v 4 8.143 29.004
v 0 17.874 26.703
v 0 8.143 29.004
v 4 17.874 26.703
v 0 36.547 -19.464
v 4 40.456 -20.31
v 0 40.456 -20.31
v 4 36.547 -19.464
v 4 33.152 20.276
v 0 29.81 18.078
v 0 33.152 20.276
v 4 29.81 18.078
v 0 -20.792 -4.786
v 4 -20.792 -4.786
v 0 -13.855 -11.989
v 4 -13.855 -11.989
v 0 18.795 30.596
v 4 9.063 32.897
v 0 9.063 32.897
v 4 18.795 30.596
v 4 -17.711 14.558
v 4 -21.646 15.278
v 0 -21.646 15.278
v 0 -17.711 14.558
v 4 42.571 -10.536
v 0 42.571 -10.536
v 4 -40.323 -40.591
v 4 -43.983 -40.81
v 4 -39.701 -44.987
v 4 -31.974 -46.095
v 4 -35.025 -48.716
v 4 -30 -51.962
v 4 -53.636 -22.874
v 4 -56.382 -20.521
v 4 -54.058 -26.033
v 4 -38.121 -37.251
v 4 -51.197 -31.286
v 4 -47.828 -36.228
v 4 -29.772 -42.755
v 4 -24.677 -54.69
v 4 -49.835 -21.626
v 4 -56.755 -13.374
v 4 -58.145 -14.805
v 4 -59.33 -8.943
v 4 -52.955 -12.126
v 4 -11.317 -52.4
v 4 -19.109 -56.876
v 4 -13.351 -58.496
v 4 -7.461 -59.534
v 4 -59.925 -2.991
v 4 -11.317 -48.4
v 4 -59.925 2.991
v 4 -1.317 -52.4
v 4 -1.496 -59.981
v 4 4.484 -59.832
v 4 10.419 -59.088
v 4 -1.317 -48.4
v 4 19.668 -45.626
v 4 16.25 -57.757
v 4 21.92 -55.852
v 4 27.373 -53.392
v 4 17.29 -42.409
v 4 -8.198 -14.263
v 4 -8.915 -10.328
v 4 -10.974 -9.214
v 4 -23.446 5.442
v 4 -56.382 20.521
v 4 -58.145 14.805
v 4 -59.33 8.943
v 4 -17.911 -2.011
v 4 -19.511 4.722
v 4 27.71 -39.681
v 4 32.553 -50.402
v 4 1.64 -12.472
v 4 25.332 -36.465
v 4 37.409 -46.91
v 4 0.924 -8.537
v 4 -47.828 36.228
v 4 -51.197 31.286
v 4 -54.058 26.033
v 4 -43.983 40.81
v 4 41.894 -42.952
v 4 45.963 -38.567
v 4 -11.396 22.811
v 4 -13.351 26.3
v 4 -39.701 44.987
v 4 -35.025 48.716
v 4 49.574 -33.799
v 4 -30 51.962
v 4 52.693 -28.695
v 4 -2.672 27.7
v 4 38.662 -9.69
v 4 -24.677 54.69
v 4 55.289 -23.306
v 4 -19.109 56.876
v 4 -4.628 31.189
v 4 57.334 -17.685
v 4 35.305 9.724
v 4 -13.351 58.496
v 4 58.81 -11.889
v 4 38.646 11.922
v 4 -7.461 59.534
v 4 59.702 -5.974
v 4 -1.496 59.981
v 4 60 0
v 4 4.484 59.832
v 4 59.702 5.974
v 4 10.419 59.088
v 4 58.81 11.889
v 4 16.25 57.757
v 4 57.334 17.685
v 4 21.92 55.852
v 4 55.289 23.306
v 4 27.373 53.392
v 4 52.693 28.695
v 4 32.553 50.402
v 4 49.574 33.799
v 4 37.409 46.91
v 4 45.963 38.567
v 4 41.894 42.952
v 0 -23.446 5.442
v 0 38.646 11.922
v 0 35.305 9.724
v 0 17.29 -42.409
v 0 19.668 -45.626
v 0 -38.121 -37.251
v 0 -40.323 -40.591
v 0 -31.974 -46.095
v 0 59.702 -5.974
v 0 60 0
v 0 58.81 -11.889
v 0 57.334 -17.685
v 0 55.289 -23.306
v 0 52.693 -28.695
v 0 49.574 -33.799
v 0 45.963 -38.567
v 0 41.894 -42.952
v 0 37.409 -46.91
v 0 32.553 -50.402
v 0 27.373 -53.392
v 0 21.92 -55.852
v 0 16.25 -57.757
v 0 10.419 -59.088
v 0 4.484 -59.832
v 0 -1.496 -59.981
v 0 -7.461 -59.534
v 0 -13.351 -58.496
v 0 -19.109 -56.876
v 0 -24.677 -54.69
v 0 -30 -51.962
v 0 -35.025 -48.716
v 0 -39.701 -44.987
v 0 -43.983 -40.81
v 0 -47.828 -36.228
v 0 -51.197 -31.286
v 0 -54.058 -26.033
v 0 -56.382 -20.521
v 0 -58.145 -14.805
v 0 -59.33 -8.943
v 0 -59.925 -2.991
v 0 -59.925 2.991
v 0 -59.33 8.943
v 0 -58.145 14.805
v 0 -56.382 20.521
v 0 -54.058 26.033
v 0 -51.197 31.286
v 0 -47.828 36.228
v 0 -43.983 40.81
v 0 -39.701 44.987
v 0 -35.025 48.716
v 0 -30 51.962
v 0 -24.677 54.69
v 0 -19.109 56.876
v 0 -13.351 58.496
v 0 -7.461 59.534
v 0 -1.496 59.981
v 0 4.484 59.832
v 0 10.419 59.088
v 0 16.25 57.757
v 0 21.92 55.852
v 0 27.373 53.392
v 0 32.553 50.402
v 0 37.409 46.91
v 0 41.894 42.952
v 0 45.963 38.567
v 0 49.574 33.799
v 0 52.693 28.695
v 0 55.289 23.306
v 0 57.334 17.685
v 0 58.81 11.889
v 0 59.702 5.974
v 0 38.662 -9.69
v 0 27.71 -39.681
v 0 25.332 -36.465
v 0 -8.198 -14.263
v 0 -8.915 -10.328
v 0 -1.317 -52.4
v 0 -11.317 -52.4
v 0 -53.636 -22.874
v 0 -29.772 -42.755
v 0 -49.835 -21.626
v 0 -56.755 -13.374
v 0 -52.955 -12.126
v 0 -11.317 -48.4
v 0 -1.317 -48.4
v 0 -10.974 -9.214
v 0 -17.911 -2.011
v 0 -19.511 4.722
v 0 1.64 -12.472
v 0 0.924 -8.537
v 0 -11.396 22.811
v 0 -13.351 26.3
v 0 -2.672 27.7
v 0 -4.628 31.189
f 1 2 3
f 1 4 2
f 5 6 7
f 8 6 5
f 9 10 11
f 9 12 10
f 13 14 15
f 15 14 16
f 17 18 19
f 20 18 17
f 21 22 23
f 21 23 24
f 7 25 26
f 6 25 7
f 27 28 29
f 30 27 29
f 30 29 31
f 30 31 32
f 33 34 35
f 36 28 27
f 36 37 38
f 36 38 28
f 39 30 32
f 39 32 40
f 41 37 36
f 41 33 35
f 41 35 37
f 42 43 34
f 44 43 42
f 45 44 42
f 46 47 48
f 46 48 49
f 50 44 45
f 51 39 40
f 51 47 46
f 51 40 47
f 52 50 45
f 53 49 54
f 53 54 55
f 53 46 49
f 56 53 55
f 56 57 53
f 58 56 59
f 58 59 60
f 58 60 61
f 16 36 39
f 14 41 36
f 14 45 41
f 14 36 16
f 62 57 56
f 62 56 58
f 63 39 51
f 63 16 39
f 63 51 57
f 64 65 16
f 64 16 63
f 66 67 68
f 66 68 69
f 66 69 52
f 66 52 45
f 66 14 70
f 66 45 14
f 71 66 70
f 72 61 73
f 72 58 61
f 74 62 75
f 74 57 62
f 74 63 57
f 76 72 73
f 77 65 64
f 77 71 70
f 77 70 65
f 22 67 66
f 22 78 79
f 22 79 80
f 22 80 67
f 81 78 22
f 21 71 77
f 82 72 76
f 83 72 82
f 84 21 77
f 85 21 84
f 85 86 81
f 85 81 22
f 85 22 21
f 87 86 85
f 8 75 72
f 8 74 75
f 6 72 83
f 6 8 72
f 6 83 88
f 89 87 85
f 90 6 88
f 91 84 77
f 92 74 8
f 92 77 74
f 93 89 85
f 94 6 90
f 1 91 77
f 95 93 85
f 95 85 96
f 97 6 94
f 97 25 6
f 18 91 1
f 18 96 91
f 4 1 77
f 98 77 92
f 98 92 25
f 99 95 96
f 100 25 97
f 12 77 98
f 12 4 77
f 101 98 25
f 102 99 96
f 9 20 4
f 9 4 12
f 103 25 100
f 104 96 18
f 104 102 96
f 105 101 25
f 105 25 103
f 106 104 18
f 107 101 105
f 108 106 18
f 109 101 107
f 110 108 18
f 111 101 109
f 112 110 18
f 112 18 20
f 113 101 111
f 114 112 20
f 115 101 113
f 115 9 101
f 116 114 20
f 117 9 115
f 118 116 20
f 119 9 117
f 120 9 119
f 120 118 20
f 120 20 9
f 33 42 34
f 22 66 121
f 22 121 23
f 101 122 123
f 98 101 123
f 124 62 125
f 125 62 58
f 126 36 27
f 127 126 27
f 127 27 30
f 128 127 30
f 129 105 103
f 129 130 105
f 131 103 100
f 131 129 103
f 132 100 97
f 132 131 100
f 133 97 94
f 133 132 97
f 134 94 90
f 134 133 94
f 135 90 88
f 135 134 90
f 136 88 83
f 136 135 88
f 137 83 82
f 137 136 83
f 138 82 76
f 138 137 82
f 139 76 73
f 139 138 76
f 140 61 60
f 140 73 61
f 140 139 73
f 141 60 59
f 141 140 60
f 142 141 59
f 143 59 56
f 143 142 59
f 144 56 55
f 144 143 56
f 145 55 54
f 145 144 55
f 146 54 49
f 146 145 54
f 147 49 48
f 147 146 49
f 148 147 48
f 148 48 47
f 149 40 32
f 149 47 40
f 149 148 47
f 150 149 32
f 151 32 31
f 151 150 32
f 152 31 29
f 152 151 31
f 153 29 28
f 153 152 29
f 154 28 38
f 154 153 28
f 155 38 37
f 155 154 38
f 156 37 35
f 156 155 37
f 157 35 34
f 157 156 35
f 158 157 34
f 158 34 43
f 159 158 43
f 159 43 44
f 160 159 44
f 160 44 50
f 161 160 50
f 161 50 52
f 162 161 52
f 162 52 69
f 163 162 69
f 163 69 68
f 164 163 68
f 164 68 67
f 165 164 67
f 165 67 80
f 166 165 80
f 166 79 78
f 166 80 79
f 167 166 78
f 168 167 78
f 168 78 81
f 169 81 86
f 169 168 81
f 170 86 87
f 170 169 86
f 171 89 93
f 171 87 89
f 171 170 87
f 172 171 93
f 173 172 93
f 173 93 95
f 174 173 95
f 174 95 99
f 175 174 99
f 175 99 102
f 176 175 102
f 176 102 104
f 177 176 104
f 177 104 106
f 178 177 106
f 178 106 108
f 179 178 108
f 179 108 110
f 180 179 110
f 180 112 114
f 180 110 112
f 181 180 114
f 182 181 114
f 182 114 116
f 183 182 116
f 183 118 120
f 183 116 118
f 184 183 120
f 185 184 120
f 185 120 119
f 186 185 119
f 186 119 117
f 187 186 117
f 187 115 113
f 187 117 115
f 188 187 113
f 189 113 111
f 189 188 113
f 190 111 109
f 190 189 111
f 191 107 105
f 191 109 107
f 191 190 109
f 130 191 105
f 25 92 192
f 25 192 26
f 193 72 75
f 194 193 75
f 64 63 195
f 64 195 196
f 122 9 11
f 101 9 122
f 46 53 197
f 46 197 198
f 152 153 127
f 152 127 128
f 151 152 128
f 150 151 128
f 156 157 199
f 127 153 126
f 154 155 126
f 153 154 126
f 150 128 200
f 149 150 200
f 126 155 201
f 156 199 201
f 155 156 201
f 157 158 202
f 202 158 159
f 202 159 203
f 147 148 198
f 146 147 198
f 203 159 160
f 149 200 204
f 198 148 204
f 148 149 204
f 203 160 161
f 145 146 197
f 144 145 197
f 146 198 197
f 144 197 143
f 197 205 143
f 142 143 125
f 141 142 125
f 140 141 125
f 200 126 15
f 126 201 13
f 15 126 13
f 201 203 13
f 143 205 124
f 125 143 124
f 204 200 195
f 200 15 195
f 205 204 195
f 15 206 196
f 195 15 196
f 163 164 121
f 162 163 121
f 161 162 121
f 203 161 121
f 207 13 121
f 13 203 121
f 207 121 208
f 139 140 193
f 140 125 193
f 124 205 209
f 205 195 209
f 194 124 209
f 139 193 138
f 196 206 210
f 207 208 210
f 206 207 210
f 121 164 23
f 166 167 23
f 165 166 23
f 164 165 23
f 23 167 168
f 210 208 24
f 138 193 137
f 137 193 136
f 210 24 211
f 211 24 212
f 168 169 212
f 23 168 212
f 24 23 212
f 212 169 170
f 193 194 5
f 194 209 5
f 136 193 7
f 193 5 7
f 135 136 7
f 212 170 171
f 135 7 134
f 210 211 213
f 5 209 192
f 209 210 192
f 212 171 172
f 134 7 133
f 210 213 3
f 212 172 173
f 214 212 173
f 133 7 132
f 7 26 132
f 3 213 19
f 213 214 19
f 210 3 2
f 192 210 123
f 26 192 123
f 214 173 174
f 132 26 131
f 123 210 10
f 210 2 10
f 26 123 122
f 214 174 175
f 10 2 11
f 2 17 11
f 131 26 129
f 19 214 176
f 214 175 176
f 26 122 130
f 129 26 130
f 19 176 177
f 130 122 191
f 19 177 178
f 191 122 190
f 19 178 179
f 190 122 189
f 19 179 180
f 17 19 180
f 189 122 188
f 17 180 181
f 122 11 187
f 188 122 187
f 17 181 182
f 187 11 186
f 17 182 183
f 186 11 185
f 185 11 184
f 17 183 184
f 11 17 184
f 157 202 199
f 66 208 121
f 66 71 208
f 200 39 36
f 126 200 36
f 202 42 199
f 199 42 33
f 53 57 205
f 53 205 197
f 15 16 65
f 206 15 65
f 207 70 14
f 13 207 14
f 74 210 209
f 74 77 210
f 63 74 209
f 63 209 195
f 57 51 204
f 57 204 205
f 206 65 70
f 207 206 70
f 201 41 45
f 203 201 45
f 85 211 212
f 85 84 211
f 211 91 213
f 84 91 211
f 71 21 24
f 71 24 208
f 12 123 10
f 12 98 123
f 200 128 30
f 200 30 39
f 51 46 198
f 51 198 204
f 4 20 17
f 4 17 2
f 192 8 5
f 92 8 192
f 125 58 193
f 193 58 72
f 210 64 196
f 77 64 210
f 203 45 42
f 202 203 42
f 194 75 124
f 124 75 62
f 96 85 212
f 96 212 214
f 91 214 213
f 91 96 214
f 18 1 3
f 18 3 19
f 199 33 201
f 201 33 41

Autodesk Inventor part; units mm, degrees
ref_plane "YZ Plane" through (0, 0, 0) normal (1, 0, 0) x (0, 1, 0)
ref_plane "XZ Plane" through (0, 0, 0) normal (0, 1, 0) x (-1, 0, 0)
ref_plane "XY Plane" through (0, 0, 0) normal (0, 0, 1) x (1, 0, 0)
sketch "Эскиз1" plane through (0, 0, 0) normal (1, 0, 0) x (0, 1, 0)
  circle A0 centre (0, 0) radius 60
  point P0 (0, -60)
extrude "Выдавливание1" add sketch "Эскиз1" along normal blind 4
sketch "Эскиз2" plane through (4, 0, 0) normal (1, 0, 0) x (0, 0, -1)
  point P0 (0, 0)
  point P1 (0, -60)
sketch "Эскиз3" plane through (4, 0, 0) normal (1, 0, 0) x (0, 0, -1)
  line L0 (0, -92.75) -> (0, 85.4583) construction
  circle A0 centre (0, 0) radius 60 construction
  line L1 (40.5908, -40.3227) -> (46.095, -31.9738)
  line L2 (46.095, -31.9738) -> (42.7554, -29.7722)
  line L3 (42.7554, -29.7722) -> (37.2513, -38.1211)
  line L4 (37.2513, -38.1211) -> (40.5908, -40.3227)
  line L5 (40.5908, -40.3227) -> (42.7554, -29.7722) construction
  line L6 (46.095, -31.9738) -> (37.2513, -38.1211) construction
  line L7 (41.6731, -35.0475) -> (44.4252, -30.873) construction
  line L8 (31.7471, -46.47) -> (48.2596, -21.4233) construction
  line L9 (48.2596, -21.4233) -> (51.5992, -23.6249) construction
  line L10 (51.5992, -23.6249) -> (35.0866, -48.6716) construction
  line L11 (35.0866, -48.6716) -> (31.7471, -46.47) construction
  line L12 (31.7471, -46.47) -> (51.5992, -23.6249) construction
  line L13 (48.2596, -21.4233) -> (35.0866, -48.6716) construction
  circle A1 centre (0, 0) radius 60 projected
  line L14 (48.3995, -11.3168) -> (48.3995, -1.3168)
  line L15 (48.3995, -1.3168) -> (52.3995, -1.3168)
  line L16 (52.3995, -1.3168) -> (52.3995, -11.3168) construction
  line L17 (52.3995, -11.3168) -> (48.3995, -11.3168)
  line L18 (48.3995, -11.3168) -> (52.3995, -1.3168) construction
  line L19 (48.3995, -1.3168) -> (52.3995, -11.3168) construction
  line L20 (48.3995, -21.3168) -> (48.3995, 8.6832) construction
  line L21 (48.3995, 8.6832) -> (52.3995, 8.6832) construction
  line L22 (52.3995, 8.6832) -> (52.3995, -21.3168)
  line L23 (52.3995, -21.3168) -> (48.3995, -21.3168) construction
  line L24 (48.3995, -21.3168) -> (52.3995, 8.6832) construction
  line L25 (48.3995, 8.6832) -> (52.3995, -21.3168) construction
  line L26 (50.3995, -6.3168) -> (50.3995, 8.6832) construction
  line L27 (36.4646, 25.3316) -> (42.4094, 17.2905)
  line L28 (42.4094, 17.2905) -> (45.6259, 19.6684)
  line L29 (45.6259, 19.6684) -> (39.6811, 27.7095)
  line L30 (39.6811, 27.7095) -> (36.4646, 25.3316)
  line L31 (36.4646, 25.3316) -> (45.6259, 19.6684) construction
  line L32 (42.4094, 17.2905) -> (39.6811, 27.7095) construction
  line L33 (30.5198, 33.3727) -> (48.3542, 9.2494) construction
  line L34 (48.3542, 9.2494) -> (51.5707, 11.6273) construction
  line L35 (51.5707, 11.6273) -> (33.7363, 35.7506) construction
  line L36 (33.7363, 35.7506) -> (30.5198, 33.3727) construction
  line L37 (30.5198, 33.3727) -> (51.5707, 11.6273) construction
  line L38 (48.3542, 9.2494) -> (33.7363, 35.7506) construction
  line L39 (41.0453, 22.5) -> (32.1281, 34.5617) construction
  line L40 (10.536, 42.571) -> (20.3099, 40.4564)
  line L41 (20.3099, 40.4564) -> (19.464, 36.5468)
  line L42 (19.464, 36.5468) -> (9.6901, 38.6615)
  line L43 (9.6901, 38.6615) -> (10.536, 42.571)
  line L44 (10.536, 42.571) -> (19.464, 36.5468) construction
  line L45 (20.3099, 40.4564) -> (9.6901, 38.6615) construction
  line L46 (-0.0837, 40.7762) -> (29.2378, 34.4321) construction
  line L47 (29.2378, 34.4321) -> (30.0837, 38.3417) construction
  line L48 (30.0837, 38.3417) -> (0.7622, 44.6857) construction
  line L49 (0.7622, 44.6857) -> (-0.0837, 40.7762) construction
  line L50 (-0.0837, 40.7762) -> (30.0837, 38.3417) construction
  line L51 (29.2378, 34.4321) -> (0.7622, 44.6857) construction
  line L52 (0.3392, 42.7309) -> (15, 39.5589) construction
  line L53 (-20.2765, 33.1516) -> (-11.9215, 38.6465)
  line L54 (-11.9215, 38.6465) -> (-9.7235, 35.3046)
  line L55 (-9.7235, 35.3046) -> (-18.0785, 29.8096)
  line L56 (-18.0785, 29.8096) -> (-20.2765, 33.1516)
  line L57 (-20.2765, 33.1516) -> (-9.7235, 35.3046) construction
  line L58 (-11.9215, 38.6465) -> (-18.0785, 29.8096) construction
  line L59 (-26.4334, 24.3146) -> (-1.3686, 40.7995) construction
  line L60 (-1.3686, 40.7995) -> (-3.5666, 44.1415) construction
  line L61 (-3.5666, 44.1415) -> (-28.6314, 27.6566) construction
  line L62 (-28.6314, 27.6566) -> (-26.4334, 24.3146) construction
  line L63 (-26.4334, 24.3146) -> (-3.5666, 44.1415) construction
  line L64 (-1.3686, 40.7995) -> (-28.6314, 27.6566) construction
  line L65 (-15, 34.2281) -> (-2.4676, 42.4705) construction
  line L66 (-32.897, 9.0632) -> (-30.5956, 18.7948)
  line L67 (-30.5956, 18.7948) -> (-26.703, 17.8742)
  line L68 (-26.703, 17.8742) -> (-29.0044, 8.1427)
  line L69 (-29.0044, 8.1427) -> (-32.897, 9.0632)
  line L70 (-32.897, 9.0632) -> (-26.703, 17.8742) construction
  line L71 (-30.5956, 18.7948) -> (-29.0044, 8.1427) construction
  line L72 (-34.0478, 4.1975) -> (-29.4449, 23.6606) construction
  line L73 (-29.4449, 23.6606) -> (-25.5522, 22.74) construction
  line L74 (-25.5522, 22.74) -> (-30.1551, 3.2769) construction
  line L75 (-30.1551, 3.2769) -> (-34.0478, 4.1975) construction
  line L76 (-34.0478, 4.1975) -> (-25.5522, 22.74) construction
  line L77 (-29.4449, 23.6606) -> (-30.1551, 3.2769) construction
  line L78 (-29.8, 13.4687) -> (-27.4986, 23.2003) construction
  line L79 (-30.1437, 1.6896) -> (-20.3668, -15.7578) construction
  line L80 (-20.3668, -15.7578) -> (-23.8563, -17.7132) construction
  line L81 (-23.8563, -17.7132) -> (-33.6332, -0.2658) construction
  line L82 (-33.6332, -0.2658) -> (-30.1437, 1.6896) construction
  line L83 (-30.1437, 1.6896) -> (-23.8563, -17.7132) construction
  line L84 (-20.3668, -15.7578) -> (-33.6332, -0.2658) construction
  line L85 (-27.6995, -2.6723) -> (-22.811, -11.396)
  line L86 (-22.811, -11.396) -> (-26.3005, -13.3514)
  line L87 (-26.3005, -13.3514) -> (-31.189, -4.6277)
  line L88 (-31.189, -4.6277) -> (-27.6995, -2.6723)
  line L89 (-27.6995, -2.6723) -> (-26.3005, -13.3514) construction
  line L90 (-22.811, -11.396) -> (-31.189, -4.6277) construction
  line L91 (-27, -8.0118) -> (-31.8884, 0.7119) construction
  line L92 (-19.4768, -16.8116) -> (0.1967, -20.411) construction
  line L93 (0.1967, -20.411) -> (-0.5232, -24.3456) construction
  line L94 (-0.5232, -24.3456) -> (-20.1967, -20.7463) construction
  line L95 (-20.1967, -20.7463) -> (-19.4768, -16.8116) construction
  line L96 (-19.4768, -16.8116) -> (-0.5232, -24.3456) construction
  line L97 (0.1967, -20.411) -> (-20.1967, -20.7463) construction
  line L98 (-14.5584, -17.7114) -> (-4.7217, -19.5111)
  line L99 (-4.7217, -19.5111) -> (-5.4416, -23.4458)
  line L100 (-5.4416, -23.4458) -> (-15.2783, -21.6461)
  line L101 (-15.2783, -21.6461) -> (-14.5584, -17.7114)
  line L102 (-14.5584, -17.7114) -> (-5.4416, -23.4458) construction
  line L103 (-4.7217, -19.5111) -> (-15.2783, -21.6461) construction
  line L104 (-10, -20.5786) -> (-19.8367, -18.7789) construction
  line L105 (11.0144, -9.2398) -> (0.2107, -19.6457) construction
  line L106 (0.2107, -19.6457) -> (2.9856, -22.5267) construction
  line L107 (2.9856, -22.5267) -> (13.7893, -12.1208) construction
  line L108 (13.7893, -12.1208) -> (11.0144, -9.2398) construction
  line L109 (11.0144, -9.2398) -> (2.9856, -22.5267) construction
  line L110 (0.2107, -19.6457) -> (13.7893, -12.1208) construction
  line L111 (9.2138, -10.9742) -> (2.0113, -17.9114)
  line L112 (2.0113, -17.9114) -> (4.7862, -20.7923)
  line L113 (4.7862, -20.7923) -> (11.9887, -13.8551)
  line L114 (11.9887, -13.8551) -> (9.2138, -10.9742)
  line L115 (9.2138, -10.9742) -> (4.7862, -20.7923) construction
  line L116 (2.0113, -17.9114) -> (11.9887, -13.8551) construction
  line L117 (7, -15.8832) -> (10.6012, -12.4146) construction
  line L118 (10.3281, -8.9147) -> (8.5366, 0.9236)
  line L119 (8.5366, 0.9236) -> (12.4719, 1.6401)
  line L120 (12.4719, 1.6401) -> (14.2634, -8.1981)
  line L121 (14.2634, -8.1981) -> (10.3281, -8.9147)
  line L122 (10.3281, -8.9147) -> (12.4719, 1.6401) construction
  line L123 (8.5366, 0.9236) -> (14.2634, -8.1981) construction
  line L124 (10.3281, -8.9147) -> (8.5366, 0.9236)
  line L125 (8.5366, 0.9236) -> (12.4719, 1.6401)
  line L126 (12.4719, 1.6401) -> (14.2634, -8.1981)
  line L127 (14.2634, -8.1981) -> (10.3281, -8.9147)
  line L128 (10.3281, -8.9147) -> (12.4719, 1.6401) construction
  line L129 (8.5366, 0.9236) -> (14.2634, -8.1981) construction
  line L130 (11.4, -3.6373) -> (10.5043, 1.2819) construction
  line L131 (-0.9405, 1.4271) -> (9.0554, 1.7143)
  line L132 (9.0554, 1.7143) -> (8.9405, 5.7126)
  line L133 (8.9405, 5.7126) -> (-1.0554, 5.4255)
  line L134 (-1.0554, 5.4255) -> (-0.9405, 1.4271)
  line L135 (-0.9405, 1.4271) -> (8.9405, 5.7126) construction
  line L136 (9.0554, 1.7143) -> (-1.0554, 5.4255) construction
  line L137 (-0.9405, 1.4271) -> (9.0554, 1.7143)
  line L138 (9.0554, 1.7143) -> (8.9405, 5.7126)
  line L139 (8.9405, 5.7126) -> (-1.0554, 5.4255)
  line L140 (-1.0554, 5.4255) -> (-0.9405, 1.4271)
  line L141 (-0.9405, 1.4271) -> (8.9405, 5.7126) construction
  line L142 (9.0554, 1.7143) -> (-1.0554, 5.4255) construction
  line L143 (4, 3.5699) -> (-0.9979, 3.4263) construction
  line L144 (3.8726, -59.8749) -> (32.3753, -50.5157) construction
  line L145 (32.3753, -50.5157) -> (31.1274, -46.7154) construction
  line L146 (31.1274, -46.7154) -> (2.6247, -56.0745) construction
  line L147 (2.6247, -56.0745) -> (3.8726, -59.8749) construction
  line L148 (3.8726, -59.8749) -> (31.1274, -46.7154) construction
  line L149 (32.3753, -50.5157) -> (2.6247, -56.0745) construction
  line L150 (13.3735, -56.7552) -> (22.8744, -53.6355)
  line L151 (22.8744, -53.6355) -> (21.6265, -49.8351)
  line L152 (21.6265, -49.8351) -> (12.1256, -52.9548)
  line L153 (12.1256, -52.9548) -> (13.3735, -56.7552)
  line L154 (13.3735, -56.7552) -> (21.6265, -49.8351) construction
  line L155 (22.8744, -53.6355) -> (12.1256, -52.9548) construction
  line L156 (17.5, -53.2951) -> (31.7514, -48.6155) construction
  point P0 (0, -60)
  point P1 (50.3995, -6.3168)
  point P2 (41.0453, 22.5)
  point P3 (15, 39.5589)
  point P4 (15, 39.5589)
  point P5 (-15, 34.2281)
  point P6 (-15, 34.2281)
  point P7 (-15, 34.2281)
  point P8 (-29.8, 13.4687)
  point P9 (-29.8, 13.4687)
  point P10 (-27, -8.0118)
  point P11 (-27, -8.0118)
  point P12 (-10, -20.5786)
  point P13 (7, -15.8832)
  point P14 (7, -15.8832)
  point P15 (11.4, -3.6373)
  point P16 (4, 3.5699)
  point P17 (4, 3.5699)
  point P18 (17.5, -53.2951)
  dimension "d83" = 0
  dimension "d84" = 1
  dimension "d93" = 10
  dimension "d94" = 4
  dimension "d95" = 30
  dimension "d96" = 10
  dimension "d98" = 4
  dimension "d99" = 30
  dimension "d100" = 10
  dimension "d101" = 30
  dimension "d102" = 4
  dimension "d103" = 22.5
  dimension "d104" = 10
  dimension "d105" = 30
  dimension "d106" = 4
  dimension "d107" = 15
  dimension "d108" = 30
  dimension "d109" = 4
  dimension "d110" = 10
  dimension "d111" = 15
  dimension "d112" = 10
  dimension "d113" = 20
  dimension "d114" = 4
  dimension "d115" = 29.8
  dimension "d116" = 20
  dimension "d117" = 10
  dimension "d118" = 4
  dimension "d119" = 27
  dimension "d120" = 10
  dimension "d121" = 20
  dimension "d122" = 4
  dimension "d123" = 10
  dimension "d124" = 10
  dimension "d125" = 15
  dimension "d127" = 4
  dimension "d128" = 7
  dimension "d132" = 10
  dimension "d134" = 4
  dimension "d135" = 10
  dimension "d136" = 11.4
  dimension "d137" = 10
  dimension "d138" = 10
  dimension "d139" = 4
  dimension "d140" = 4
  dimension "d141" = 4
  dimension "d142" = 30
  dimension "d143" = 10
  dimension "d144" = 17.5
extrude "Выдавливание2" cut sketch "Эскиз3" against normal through all contours L4 L3 L2 L1 | L14 L15 L22 L17 | L30 L29 L28 L27 | L40 L41 L42 L43 | L53 L54 L55 L56 | L66 L67 L68 L69 | L85 L86 L87 L88 | L98 L99 L100 L101 | L114 L113 L112 L111 | L118 L119 L120 L121 | L153 L152 L151 L150
properties part number "Стенка барабана"
